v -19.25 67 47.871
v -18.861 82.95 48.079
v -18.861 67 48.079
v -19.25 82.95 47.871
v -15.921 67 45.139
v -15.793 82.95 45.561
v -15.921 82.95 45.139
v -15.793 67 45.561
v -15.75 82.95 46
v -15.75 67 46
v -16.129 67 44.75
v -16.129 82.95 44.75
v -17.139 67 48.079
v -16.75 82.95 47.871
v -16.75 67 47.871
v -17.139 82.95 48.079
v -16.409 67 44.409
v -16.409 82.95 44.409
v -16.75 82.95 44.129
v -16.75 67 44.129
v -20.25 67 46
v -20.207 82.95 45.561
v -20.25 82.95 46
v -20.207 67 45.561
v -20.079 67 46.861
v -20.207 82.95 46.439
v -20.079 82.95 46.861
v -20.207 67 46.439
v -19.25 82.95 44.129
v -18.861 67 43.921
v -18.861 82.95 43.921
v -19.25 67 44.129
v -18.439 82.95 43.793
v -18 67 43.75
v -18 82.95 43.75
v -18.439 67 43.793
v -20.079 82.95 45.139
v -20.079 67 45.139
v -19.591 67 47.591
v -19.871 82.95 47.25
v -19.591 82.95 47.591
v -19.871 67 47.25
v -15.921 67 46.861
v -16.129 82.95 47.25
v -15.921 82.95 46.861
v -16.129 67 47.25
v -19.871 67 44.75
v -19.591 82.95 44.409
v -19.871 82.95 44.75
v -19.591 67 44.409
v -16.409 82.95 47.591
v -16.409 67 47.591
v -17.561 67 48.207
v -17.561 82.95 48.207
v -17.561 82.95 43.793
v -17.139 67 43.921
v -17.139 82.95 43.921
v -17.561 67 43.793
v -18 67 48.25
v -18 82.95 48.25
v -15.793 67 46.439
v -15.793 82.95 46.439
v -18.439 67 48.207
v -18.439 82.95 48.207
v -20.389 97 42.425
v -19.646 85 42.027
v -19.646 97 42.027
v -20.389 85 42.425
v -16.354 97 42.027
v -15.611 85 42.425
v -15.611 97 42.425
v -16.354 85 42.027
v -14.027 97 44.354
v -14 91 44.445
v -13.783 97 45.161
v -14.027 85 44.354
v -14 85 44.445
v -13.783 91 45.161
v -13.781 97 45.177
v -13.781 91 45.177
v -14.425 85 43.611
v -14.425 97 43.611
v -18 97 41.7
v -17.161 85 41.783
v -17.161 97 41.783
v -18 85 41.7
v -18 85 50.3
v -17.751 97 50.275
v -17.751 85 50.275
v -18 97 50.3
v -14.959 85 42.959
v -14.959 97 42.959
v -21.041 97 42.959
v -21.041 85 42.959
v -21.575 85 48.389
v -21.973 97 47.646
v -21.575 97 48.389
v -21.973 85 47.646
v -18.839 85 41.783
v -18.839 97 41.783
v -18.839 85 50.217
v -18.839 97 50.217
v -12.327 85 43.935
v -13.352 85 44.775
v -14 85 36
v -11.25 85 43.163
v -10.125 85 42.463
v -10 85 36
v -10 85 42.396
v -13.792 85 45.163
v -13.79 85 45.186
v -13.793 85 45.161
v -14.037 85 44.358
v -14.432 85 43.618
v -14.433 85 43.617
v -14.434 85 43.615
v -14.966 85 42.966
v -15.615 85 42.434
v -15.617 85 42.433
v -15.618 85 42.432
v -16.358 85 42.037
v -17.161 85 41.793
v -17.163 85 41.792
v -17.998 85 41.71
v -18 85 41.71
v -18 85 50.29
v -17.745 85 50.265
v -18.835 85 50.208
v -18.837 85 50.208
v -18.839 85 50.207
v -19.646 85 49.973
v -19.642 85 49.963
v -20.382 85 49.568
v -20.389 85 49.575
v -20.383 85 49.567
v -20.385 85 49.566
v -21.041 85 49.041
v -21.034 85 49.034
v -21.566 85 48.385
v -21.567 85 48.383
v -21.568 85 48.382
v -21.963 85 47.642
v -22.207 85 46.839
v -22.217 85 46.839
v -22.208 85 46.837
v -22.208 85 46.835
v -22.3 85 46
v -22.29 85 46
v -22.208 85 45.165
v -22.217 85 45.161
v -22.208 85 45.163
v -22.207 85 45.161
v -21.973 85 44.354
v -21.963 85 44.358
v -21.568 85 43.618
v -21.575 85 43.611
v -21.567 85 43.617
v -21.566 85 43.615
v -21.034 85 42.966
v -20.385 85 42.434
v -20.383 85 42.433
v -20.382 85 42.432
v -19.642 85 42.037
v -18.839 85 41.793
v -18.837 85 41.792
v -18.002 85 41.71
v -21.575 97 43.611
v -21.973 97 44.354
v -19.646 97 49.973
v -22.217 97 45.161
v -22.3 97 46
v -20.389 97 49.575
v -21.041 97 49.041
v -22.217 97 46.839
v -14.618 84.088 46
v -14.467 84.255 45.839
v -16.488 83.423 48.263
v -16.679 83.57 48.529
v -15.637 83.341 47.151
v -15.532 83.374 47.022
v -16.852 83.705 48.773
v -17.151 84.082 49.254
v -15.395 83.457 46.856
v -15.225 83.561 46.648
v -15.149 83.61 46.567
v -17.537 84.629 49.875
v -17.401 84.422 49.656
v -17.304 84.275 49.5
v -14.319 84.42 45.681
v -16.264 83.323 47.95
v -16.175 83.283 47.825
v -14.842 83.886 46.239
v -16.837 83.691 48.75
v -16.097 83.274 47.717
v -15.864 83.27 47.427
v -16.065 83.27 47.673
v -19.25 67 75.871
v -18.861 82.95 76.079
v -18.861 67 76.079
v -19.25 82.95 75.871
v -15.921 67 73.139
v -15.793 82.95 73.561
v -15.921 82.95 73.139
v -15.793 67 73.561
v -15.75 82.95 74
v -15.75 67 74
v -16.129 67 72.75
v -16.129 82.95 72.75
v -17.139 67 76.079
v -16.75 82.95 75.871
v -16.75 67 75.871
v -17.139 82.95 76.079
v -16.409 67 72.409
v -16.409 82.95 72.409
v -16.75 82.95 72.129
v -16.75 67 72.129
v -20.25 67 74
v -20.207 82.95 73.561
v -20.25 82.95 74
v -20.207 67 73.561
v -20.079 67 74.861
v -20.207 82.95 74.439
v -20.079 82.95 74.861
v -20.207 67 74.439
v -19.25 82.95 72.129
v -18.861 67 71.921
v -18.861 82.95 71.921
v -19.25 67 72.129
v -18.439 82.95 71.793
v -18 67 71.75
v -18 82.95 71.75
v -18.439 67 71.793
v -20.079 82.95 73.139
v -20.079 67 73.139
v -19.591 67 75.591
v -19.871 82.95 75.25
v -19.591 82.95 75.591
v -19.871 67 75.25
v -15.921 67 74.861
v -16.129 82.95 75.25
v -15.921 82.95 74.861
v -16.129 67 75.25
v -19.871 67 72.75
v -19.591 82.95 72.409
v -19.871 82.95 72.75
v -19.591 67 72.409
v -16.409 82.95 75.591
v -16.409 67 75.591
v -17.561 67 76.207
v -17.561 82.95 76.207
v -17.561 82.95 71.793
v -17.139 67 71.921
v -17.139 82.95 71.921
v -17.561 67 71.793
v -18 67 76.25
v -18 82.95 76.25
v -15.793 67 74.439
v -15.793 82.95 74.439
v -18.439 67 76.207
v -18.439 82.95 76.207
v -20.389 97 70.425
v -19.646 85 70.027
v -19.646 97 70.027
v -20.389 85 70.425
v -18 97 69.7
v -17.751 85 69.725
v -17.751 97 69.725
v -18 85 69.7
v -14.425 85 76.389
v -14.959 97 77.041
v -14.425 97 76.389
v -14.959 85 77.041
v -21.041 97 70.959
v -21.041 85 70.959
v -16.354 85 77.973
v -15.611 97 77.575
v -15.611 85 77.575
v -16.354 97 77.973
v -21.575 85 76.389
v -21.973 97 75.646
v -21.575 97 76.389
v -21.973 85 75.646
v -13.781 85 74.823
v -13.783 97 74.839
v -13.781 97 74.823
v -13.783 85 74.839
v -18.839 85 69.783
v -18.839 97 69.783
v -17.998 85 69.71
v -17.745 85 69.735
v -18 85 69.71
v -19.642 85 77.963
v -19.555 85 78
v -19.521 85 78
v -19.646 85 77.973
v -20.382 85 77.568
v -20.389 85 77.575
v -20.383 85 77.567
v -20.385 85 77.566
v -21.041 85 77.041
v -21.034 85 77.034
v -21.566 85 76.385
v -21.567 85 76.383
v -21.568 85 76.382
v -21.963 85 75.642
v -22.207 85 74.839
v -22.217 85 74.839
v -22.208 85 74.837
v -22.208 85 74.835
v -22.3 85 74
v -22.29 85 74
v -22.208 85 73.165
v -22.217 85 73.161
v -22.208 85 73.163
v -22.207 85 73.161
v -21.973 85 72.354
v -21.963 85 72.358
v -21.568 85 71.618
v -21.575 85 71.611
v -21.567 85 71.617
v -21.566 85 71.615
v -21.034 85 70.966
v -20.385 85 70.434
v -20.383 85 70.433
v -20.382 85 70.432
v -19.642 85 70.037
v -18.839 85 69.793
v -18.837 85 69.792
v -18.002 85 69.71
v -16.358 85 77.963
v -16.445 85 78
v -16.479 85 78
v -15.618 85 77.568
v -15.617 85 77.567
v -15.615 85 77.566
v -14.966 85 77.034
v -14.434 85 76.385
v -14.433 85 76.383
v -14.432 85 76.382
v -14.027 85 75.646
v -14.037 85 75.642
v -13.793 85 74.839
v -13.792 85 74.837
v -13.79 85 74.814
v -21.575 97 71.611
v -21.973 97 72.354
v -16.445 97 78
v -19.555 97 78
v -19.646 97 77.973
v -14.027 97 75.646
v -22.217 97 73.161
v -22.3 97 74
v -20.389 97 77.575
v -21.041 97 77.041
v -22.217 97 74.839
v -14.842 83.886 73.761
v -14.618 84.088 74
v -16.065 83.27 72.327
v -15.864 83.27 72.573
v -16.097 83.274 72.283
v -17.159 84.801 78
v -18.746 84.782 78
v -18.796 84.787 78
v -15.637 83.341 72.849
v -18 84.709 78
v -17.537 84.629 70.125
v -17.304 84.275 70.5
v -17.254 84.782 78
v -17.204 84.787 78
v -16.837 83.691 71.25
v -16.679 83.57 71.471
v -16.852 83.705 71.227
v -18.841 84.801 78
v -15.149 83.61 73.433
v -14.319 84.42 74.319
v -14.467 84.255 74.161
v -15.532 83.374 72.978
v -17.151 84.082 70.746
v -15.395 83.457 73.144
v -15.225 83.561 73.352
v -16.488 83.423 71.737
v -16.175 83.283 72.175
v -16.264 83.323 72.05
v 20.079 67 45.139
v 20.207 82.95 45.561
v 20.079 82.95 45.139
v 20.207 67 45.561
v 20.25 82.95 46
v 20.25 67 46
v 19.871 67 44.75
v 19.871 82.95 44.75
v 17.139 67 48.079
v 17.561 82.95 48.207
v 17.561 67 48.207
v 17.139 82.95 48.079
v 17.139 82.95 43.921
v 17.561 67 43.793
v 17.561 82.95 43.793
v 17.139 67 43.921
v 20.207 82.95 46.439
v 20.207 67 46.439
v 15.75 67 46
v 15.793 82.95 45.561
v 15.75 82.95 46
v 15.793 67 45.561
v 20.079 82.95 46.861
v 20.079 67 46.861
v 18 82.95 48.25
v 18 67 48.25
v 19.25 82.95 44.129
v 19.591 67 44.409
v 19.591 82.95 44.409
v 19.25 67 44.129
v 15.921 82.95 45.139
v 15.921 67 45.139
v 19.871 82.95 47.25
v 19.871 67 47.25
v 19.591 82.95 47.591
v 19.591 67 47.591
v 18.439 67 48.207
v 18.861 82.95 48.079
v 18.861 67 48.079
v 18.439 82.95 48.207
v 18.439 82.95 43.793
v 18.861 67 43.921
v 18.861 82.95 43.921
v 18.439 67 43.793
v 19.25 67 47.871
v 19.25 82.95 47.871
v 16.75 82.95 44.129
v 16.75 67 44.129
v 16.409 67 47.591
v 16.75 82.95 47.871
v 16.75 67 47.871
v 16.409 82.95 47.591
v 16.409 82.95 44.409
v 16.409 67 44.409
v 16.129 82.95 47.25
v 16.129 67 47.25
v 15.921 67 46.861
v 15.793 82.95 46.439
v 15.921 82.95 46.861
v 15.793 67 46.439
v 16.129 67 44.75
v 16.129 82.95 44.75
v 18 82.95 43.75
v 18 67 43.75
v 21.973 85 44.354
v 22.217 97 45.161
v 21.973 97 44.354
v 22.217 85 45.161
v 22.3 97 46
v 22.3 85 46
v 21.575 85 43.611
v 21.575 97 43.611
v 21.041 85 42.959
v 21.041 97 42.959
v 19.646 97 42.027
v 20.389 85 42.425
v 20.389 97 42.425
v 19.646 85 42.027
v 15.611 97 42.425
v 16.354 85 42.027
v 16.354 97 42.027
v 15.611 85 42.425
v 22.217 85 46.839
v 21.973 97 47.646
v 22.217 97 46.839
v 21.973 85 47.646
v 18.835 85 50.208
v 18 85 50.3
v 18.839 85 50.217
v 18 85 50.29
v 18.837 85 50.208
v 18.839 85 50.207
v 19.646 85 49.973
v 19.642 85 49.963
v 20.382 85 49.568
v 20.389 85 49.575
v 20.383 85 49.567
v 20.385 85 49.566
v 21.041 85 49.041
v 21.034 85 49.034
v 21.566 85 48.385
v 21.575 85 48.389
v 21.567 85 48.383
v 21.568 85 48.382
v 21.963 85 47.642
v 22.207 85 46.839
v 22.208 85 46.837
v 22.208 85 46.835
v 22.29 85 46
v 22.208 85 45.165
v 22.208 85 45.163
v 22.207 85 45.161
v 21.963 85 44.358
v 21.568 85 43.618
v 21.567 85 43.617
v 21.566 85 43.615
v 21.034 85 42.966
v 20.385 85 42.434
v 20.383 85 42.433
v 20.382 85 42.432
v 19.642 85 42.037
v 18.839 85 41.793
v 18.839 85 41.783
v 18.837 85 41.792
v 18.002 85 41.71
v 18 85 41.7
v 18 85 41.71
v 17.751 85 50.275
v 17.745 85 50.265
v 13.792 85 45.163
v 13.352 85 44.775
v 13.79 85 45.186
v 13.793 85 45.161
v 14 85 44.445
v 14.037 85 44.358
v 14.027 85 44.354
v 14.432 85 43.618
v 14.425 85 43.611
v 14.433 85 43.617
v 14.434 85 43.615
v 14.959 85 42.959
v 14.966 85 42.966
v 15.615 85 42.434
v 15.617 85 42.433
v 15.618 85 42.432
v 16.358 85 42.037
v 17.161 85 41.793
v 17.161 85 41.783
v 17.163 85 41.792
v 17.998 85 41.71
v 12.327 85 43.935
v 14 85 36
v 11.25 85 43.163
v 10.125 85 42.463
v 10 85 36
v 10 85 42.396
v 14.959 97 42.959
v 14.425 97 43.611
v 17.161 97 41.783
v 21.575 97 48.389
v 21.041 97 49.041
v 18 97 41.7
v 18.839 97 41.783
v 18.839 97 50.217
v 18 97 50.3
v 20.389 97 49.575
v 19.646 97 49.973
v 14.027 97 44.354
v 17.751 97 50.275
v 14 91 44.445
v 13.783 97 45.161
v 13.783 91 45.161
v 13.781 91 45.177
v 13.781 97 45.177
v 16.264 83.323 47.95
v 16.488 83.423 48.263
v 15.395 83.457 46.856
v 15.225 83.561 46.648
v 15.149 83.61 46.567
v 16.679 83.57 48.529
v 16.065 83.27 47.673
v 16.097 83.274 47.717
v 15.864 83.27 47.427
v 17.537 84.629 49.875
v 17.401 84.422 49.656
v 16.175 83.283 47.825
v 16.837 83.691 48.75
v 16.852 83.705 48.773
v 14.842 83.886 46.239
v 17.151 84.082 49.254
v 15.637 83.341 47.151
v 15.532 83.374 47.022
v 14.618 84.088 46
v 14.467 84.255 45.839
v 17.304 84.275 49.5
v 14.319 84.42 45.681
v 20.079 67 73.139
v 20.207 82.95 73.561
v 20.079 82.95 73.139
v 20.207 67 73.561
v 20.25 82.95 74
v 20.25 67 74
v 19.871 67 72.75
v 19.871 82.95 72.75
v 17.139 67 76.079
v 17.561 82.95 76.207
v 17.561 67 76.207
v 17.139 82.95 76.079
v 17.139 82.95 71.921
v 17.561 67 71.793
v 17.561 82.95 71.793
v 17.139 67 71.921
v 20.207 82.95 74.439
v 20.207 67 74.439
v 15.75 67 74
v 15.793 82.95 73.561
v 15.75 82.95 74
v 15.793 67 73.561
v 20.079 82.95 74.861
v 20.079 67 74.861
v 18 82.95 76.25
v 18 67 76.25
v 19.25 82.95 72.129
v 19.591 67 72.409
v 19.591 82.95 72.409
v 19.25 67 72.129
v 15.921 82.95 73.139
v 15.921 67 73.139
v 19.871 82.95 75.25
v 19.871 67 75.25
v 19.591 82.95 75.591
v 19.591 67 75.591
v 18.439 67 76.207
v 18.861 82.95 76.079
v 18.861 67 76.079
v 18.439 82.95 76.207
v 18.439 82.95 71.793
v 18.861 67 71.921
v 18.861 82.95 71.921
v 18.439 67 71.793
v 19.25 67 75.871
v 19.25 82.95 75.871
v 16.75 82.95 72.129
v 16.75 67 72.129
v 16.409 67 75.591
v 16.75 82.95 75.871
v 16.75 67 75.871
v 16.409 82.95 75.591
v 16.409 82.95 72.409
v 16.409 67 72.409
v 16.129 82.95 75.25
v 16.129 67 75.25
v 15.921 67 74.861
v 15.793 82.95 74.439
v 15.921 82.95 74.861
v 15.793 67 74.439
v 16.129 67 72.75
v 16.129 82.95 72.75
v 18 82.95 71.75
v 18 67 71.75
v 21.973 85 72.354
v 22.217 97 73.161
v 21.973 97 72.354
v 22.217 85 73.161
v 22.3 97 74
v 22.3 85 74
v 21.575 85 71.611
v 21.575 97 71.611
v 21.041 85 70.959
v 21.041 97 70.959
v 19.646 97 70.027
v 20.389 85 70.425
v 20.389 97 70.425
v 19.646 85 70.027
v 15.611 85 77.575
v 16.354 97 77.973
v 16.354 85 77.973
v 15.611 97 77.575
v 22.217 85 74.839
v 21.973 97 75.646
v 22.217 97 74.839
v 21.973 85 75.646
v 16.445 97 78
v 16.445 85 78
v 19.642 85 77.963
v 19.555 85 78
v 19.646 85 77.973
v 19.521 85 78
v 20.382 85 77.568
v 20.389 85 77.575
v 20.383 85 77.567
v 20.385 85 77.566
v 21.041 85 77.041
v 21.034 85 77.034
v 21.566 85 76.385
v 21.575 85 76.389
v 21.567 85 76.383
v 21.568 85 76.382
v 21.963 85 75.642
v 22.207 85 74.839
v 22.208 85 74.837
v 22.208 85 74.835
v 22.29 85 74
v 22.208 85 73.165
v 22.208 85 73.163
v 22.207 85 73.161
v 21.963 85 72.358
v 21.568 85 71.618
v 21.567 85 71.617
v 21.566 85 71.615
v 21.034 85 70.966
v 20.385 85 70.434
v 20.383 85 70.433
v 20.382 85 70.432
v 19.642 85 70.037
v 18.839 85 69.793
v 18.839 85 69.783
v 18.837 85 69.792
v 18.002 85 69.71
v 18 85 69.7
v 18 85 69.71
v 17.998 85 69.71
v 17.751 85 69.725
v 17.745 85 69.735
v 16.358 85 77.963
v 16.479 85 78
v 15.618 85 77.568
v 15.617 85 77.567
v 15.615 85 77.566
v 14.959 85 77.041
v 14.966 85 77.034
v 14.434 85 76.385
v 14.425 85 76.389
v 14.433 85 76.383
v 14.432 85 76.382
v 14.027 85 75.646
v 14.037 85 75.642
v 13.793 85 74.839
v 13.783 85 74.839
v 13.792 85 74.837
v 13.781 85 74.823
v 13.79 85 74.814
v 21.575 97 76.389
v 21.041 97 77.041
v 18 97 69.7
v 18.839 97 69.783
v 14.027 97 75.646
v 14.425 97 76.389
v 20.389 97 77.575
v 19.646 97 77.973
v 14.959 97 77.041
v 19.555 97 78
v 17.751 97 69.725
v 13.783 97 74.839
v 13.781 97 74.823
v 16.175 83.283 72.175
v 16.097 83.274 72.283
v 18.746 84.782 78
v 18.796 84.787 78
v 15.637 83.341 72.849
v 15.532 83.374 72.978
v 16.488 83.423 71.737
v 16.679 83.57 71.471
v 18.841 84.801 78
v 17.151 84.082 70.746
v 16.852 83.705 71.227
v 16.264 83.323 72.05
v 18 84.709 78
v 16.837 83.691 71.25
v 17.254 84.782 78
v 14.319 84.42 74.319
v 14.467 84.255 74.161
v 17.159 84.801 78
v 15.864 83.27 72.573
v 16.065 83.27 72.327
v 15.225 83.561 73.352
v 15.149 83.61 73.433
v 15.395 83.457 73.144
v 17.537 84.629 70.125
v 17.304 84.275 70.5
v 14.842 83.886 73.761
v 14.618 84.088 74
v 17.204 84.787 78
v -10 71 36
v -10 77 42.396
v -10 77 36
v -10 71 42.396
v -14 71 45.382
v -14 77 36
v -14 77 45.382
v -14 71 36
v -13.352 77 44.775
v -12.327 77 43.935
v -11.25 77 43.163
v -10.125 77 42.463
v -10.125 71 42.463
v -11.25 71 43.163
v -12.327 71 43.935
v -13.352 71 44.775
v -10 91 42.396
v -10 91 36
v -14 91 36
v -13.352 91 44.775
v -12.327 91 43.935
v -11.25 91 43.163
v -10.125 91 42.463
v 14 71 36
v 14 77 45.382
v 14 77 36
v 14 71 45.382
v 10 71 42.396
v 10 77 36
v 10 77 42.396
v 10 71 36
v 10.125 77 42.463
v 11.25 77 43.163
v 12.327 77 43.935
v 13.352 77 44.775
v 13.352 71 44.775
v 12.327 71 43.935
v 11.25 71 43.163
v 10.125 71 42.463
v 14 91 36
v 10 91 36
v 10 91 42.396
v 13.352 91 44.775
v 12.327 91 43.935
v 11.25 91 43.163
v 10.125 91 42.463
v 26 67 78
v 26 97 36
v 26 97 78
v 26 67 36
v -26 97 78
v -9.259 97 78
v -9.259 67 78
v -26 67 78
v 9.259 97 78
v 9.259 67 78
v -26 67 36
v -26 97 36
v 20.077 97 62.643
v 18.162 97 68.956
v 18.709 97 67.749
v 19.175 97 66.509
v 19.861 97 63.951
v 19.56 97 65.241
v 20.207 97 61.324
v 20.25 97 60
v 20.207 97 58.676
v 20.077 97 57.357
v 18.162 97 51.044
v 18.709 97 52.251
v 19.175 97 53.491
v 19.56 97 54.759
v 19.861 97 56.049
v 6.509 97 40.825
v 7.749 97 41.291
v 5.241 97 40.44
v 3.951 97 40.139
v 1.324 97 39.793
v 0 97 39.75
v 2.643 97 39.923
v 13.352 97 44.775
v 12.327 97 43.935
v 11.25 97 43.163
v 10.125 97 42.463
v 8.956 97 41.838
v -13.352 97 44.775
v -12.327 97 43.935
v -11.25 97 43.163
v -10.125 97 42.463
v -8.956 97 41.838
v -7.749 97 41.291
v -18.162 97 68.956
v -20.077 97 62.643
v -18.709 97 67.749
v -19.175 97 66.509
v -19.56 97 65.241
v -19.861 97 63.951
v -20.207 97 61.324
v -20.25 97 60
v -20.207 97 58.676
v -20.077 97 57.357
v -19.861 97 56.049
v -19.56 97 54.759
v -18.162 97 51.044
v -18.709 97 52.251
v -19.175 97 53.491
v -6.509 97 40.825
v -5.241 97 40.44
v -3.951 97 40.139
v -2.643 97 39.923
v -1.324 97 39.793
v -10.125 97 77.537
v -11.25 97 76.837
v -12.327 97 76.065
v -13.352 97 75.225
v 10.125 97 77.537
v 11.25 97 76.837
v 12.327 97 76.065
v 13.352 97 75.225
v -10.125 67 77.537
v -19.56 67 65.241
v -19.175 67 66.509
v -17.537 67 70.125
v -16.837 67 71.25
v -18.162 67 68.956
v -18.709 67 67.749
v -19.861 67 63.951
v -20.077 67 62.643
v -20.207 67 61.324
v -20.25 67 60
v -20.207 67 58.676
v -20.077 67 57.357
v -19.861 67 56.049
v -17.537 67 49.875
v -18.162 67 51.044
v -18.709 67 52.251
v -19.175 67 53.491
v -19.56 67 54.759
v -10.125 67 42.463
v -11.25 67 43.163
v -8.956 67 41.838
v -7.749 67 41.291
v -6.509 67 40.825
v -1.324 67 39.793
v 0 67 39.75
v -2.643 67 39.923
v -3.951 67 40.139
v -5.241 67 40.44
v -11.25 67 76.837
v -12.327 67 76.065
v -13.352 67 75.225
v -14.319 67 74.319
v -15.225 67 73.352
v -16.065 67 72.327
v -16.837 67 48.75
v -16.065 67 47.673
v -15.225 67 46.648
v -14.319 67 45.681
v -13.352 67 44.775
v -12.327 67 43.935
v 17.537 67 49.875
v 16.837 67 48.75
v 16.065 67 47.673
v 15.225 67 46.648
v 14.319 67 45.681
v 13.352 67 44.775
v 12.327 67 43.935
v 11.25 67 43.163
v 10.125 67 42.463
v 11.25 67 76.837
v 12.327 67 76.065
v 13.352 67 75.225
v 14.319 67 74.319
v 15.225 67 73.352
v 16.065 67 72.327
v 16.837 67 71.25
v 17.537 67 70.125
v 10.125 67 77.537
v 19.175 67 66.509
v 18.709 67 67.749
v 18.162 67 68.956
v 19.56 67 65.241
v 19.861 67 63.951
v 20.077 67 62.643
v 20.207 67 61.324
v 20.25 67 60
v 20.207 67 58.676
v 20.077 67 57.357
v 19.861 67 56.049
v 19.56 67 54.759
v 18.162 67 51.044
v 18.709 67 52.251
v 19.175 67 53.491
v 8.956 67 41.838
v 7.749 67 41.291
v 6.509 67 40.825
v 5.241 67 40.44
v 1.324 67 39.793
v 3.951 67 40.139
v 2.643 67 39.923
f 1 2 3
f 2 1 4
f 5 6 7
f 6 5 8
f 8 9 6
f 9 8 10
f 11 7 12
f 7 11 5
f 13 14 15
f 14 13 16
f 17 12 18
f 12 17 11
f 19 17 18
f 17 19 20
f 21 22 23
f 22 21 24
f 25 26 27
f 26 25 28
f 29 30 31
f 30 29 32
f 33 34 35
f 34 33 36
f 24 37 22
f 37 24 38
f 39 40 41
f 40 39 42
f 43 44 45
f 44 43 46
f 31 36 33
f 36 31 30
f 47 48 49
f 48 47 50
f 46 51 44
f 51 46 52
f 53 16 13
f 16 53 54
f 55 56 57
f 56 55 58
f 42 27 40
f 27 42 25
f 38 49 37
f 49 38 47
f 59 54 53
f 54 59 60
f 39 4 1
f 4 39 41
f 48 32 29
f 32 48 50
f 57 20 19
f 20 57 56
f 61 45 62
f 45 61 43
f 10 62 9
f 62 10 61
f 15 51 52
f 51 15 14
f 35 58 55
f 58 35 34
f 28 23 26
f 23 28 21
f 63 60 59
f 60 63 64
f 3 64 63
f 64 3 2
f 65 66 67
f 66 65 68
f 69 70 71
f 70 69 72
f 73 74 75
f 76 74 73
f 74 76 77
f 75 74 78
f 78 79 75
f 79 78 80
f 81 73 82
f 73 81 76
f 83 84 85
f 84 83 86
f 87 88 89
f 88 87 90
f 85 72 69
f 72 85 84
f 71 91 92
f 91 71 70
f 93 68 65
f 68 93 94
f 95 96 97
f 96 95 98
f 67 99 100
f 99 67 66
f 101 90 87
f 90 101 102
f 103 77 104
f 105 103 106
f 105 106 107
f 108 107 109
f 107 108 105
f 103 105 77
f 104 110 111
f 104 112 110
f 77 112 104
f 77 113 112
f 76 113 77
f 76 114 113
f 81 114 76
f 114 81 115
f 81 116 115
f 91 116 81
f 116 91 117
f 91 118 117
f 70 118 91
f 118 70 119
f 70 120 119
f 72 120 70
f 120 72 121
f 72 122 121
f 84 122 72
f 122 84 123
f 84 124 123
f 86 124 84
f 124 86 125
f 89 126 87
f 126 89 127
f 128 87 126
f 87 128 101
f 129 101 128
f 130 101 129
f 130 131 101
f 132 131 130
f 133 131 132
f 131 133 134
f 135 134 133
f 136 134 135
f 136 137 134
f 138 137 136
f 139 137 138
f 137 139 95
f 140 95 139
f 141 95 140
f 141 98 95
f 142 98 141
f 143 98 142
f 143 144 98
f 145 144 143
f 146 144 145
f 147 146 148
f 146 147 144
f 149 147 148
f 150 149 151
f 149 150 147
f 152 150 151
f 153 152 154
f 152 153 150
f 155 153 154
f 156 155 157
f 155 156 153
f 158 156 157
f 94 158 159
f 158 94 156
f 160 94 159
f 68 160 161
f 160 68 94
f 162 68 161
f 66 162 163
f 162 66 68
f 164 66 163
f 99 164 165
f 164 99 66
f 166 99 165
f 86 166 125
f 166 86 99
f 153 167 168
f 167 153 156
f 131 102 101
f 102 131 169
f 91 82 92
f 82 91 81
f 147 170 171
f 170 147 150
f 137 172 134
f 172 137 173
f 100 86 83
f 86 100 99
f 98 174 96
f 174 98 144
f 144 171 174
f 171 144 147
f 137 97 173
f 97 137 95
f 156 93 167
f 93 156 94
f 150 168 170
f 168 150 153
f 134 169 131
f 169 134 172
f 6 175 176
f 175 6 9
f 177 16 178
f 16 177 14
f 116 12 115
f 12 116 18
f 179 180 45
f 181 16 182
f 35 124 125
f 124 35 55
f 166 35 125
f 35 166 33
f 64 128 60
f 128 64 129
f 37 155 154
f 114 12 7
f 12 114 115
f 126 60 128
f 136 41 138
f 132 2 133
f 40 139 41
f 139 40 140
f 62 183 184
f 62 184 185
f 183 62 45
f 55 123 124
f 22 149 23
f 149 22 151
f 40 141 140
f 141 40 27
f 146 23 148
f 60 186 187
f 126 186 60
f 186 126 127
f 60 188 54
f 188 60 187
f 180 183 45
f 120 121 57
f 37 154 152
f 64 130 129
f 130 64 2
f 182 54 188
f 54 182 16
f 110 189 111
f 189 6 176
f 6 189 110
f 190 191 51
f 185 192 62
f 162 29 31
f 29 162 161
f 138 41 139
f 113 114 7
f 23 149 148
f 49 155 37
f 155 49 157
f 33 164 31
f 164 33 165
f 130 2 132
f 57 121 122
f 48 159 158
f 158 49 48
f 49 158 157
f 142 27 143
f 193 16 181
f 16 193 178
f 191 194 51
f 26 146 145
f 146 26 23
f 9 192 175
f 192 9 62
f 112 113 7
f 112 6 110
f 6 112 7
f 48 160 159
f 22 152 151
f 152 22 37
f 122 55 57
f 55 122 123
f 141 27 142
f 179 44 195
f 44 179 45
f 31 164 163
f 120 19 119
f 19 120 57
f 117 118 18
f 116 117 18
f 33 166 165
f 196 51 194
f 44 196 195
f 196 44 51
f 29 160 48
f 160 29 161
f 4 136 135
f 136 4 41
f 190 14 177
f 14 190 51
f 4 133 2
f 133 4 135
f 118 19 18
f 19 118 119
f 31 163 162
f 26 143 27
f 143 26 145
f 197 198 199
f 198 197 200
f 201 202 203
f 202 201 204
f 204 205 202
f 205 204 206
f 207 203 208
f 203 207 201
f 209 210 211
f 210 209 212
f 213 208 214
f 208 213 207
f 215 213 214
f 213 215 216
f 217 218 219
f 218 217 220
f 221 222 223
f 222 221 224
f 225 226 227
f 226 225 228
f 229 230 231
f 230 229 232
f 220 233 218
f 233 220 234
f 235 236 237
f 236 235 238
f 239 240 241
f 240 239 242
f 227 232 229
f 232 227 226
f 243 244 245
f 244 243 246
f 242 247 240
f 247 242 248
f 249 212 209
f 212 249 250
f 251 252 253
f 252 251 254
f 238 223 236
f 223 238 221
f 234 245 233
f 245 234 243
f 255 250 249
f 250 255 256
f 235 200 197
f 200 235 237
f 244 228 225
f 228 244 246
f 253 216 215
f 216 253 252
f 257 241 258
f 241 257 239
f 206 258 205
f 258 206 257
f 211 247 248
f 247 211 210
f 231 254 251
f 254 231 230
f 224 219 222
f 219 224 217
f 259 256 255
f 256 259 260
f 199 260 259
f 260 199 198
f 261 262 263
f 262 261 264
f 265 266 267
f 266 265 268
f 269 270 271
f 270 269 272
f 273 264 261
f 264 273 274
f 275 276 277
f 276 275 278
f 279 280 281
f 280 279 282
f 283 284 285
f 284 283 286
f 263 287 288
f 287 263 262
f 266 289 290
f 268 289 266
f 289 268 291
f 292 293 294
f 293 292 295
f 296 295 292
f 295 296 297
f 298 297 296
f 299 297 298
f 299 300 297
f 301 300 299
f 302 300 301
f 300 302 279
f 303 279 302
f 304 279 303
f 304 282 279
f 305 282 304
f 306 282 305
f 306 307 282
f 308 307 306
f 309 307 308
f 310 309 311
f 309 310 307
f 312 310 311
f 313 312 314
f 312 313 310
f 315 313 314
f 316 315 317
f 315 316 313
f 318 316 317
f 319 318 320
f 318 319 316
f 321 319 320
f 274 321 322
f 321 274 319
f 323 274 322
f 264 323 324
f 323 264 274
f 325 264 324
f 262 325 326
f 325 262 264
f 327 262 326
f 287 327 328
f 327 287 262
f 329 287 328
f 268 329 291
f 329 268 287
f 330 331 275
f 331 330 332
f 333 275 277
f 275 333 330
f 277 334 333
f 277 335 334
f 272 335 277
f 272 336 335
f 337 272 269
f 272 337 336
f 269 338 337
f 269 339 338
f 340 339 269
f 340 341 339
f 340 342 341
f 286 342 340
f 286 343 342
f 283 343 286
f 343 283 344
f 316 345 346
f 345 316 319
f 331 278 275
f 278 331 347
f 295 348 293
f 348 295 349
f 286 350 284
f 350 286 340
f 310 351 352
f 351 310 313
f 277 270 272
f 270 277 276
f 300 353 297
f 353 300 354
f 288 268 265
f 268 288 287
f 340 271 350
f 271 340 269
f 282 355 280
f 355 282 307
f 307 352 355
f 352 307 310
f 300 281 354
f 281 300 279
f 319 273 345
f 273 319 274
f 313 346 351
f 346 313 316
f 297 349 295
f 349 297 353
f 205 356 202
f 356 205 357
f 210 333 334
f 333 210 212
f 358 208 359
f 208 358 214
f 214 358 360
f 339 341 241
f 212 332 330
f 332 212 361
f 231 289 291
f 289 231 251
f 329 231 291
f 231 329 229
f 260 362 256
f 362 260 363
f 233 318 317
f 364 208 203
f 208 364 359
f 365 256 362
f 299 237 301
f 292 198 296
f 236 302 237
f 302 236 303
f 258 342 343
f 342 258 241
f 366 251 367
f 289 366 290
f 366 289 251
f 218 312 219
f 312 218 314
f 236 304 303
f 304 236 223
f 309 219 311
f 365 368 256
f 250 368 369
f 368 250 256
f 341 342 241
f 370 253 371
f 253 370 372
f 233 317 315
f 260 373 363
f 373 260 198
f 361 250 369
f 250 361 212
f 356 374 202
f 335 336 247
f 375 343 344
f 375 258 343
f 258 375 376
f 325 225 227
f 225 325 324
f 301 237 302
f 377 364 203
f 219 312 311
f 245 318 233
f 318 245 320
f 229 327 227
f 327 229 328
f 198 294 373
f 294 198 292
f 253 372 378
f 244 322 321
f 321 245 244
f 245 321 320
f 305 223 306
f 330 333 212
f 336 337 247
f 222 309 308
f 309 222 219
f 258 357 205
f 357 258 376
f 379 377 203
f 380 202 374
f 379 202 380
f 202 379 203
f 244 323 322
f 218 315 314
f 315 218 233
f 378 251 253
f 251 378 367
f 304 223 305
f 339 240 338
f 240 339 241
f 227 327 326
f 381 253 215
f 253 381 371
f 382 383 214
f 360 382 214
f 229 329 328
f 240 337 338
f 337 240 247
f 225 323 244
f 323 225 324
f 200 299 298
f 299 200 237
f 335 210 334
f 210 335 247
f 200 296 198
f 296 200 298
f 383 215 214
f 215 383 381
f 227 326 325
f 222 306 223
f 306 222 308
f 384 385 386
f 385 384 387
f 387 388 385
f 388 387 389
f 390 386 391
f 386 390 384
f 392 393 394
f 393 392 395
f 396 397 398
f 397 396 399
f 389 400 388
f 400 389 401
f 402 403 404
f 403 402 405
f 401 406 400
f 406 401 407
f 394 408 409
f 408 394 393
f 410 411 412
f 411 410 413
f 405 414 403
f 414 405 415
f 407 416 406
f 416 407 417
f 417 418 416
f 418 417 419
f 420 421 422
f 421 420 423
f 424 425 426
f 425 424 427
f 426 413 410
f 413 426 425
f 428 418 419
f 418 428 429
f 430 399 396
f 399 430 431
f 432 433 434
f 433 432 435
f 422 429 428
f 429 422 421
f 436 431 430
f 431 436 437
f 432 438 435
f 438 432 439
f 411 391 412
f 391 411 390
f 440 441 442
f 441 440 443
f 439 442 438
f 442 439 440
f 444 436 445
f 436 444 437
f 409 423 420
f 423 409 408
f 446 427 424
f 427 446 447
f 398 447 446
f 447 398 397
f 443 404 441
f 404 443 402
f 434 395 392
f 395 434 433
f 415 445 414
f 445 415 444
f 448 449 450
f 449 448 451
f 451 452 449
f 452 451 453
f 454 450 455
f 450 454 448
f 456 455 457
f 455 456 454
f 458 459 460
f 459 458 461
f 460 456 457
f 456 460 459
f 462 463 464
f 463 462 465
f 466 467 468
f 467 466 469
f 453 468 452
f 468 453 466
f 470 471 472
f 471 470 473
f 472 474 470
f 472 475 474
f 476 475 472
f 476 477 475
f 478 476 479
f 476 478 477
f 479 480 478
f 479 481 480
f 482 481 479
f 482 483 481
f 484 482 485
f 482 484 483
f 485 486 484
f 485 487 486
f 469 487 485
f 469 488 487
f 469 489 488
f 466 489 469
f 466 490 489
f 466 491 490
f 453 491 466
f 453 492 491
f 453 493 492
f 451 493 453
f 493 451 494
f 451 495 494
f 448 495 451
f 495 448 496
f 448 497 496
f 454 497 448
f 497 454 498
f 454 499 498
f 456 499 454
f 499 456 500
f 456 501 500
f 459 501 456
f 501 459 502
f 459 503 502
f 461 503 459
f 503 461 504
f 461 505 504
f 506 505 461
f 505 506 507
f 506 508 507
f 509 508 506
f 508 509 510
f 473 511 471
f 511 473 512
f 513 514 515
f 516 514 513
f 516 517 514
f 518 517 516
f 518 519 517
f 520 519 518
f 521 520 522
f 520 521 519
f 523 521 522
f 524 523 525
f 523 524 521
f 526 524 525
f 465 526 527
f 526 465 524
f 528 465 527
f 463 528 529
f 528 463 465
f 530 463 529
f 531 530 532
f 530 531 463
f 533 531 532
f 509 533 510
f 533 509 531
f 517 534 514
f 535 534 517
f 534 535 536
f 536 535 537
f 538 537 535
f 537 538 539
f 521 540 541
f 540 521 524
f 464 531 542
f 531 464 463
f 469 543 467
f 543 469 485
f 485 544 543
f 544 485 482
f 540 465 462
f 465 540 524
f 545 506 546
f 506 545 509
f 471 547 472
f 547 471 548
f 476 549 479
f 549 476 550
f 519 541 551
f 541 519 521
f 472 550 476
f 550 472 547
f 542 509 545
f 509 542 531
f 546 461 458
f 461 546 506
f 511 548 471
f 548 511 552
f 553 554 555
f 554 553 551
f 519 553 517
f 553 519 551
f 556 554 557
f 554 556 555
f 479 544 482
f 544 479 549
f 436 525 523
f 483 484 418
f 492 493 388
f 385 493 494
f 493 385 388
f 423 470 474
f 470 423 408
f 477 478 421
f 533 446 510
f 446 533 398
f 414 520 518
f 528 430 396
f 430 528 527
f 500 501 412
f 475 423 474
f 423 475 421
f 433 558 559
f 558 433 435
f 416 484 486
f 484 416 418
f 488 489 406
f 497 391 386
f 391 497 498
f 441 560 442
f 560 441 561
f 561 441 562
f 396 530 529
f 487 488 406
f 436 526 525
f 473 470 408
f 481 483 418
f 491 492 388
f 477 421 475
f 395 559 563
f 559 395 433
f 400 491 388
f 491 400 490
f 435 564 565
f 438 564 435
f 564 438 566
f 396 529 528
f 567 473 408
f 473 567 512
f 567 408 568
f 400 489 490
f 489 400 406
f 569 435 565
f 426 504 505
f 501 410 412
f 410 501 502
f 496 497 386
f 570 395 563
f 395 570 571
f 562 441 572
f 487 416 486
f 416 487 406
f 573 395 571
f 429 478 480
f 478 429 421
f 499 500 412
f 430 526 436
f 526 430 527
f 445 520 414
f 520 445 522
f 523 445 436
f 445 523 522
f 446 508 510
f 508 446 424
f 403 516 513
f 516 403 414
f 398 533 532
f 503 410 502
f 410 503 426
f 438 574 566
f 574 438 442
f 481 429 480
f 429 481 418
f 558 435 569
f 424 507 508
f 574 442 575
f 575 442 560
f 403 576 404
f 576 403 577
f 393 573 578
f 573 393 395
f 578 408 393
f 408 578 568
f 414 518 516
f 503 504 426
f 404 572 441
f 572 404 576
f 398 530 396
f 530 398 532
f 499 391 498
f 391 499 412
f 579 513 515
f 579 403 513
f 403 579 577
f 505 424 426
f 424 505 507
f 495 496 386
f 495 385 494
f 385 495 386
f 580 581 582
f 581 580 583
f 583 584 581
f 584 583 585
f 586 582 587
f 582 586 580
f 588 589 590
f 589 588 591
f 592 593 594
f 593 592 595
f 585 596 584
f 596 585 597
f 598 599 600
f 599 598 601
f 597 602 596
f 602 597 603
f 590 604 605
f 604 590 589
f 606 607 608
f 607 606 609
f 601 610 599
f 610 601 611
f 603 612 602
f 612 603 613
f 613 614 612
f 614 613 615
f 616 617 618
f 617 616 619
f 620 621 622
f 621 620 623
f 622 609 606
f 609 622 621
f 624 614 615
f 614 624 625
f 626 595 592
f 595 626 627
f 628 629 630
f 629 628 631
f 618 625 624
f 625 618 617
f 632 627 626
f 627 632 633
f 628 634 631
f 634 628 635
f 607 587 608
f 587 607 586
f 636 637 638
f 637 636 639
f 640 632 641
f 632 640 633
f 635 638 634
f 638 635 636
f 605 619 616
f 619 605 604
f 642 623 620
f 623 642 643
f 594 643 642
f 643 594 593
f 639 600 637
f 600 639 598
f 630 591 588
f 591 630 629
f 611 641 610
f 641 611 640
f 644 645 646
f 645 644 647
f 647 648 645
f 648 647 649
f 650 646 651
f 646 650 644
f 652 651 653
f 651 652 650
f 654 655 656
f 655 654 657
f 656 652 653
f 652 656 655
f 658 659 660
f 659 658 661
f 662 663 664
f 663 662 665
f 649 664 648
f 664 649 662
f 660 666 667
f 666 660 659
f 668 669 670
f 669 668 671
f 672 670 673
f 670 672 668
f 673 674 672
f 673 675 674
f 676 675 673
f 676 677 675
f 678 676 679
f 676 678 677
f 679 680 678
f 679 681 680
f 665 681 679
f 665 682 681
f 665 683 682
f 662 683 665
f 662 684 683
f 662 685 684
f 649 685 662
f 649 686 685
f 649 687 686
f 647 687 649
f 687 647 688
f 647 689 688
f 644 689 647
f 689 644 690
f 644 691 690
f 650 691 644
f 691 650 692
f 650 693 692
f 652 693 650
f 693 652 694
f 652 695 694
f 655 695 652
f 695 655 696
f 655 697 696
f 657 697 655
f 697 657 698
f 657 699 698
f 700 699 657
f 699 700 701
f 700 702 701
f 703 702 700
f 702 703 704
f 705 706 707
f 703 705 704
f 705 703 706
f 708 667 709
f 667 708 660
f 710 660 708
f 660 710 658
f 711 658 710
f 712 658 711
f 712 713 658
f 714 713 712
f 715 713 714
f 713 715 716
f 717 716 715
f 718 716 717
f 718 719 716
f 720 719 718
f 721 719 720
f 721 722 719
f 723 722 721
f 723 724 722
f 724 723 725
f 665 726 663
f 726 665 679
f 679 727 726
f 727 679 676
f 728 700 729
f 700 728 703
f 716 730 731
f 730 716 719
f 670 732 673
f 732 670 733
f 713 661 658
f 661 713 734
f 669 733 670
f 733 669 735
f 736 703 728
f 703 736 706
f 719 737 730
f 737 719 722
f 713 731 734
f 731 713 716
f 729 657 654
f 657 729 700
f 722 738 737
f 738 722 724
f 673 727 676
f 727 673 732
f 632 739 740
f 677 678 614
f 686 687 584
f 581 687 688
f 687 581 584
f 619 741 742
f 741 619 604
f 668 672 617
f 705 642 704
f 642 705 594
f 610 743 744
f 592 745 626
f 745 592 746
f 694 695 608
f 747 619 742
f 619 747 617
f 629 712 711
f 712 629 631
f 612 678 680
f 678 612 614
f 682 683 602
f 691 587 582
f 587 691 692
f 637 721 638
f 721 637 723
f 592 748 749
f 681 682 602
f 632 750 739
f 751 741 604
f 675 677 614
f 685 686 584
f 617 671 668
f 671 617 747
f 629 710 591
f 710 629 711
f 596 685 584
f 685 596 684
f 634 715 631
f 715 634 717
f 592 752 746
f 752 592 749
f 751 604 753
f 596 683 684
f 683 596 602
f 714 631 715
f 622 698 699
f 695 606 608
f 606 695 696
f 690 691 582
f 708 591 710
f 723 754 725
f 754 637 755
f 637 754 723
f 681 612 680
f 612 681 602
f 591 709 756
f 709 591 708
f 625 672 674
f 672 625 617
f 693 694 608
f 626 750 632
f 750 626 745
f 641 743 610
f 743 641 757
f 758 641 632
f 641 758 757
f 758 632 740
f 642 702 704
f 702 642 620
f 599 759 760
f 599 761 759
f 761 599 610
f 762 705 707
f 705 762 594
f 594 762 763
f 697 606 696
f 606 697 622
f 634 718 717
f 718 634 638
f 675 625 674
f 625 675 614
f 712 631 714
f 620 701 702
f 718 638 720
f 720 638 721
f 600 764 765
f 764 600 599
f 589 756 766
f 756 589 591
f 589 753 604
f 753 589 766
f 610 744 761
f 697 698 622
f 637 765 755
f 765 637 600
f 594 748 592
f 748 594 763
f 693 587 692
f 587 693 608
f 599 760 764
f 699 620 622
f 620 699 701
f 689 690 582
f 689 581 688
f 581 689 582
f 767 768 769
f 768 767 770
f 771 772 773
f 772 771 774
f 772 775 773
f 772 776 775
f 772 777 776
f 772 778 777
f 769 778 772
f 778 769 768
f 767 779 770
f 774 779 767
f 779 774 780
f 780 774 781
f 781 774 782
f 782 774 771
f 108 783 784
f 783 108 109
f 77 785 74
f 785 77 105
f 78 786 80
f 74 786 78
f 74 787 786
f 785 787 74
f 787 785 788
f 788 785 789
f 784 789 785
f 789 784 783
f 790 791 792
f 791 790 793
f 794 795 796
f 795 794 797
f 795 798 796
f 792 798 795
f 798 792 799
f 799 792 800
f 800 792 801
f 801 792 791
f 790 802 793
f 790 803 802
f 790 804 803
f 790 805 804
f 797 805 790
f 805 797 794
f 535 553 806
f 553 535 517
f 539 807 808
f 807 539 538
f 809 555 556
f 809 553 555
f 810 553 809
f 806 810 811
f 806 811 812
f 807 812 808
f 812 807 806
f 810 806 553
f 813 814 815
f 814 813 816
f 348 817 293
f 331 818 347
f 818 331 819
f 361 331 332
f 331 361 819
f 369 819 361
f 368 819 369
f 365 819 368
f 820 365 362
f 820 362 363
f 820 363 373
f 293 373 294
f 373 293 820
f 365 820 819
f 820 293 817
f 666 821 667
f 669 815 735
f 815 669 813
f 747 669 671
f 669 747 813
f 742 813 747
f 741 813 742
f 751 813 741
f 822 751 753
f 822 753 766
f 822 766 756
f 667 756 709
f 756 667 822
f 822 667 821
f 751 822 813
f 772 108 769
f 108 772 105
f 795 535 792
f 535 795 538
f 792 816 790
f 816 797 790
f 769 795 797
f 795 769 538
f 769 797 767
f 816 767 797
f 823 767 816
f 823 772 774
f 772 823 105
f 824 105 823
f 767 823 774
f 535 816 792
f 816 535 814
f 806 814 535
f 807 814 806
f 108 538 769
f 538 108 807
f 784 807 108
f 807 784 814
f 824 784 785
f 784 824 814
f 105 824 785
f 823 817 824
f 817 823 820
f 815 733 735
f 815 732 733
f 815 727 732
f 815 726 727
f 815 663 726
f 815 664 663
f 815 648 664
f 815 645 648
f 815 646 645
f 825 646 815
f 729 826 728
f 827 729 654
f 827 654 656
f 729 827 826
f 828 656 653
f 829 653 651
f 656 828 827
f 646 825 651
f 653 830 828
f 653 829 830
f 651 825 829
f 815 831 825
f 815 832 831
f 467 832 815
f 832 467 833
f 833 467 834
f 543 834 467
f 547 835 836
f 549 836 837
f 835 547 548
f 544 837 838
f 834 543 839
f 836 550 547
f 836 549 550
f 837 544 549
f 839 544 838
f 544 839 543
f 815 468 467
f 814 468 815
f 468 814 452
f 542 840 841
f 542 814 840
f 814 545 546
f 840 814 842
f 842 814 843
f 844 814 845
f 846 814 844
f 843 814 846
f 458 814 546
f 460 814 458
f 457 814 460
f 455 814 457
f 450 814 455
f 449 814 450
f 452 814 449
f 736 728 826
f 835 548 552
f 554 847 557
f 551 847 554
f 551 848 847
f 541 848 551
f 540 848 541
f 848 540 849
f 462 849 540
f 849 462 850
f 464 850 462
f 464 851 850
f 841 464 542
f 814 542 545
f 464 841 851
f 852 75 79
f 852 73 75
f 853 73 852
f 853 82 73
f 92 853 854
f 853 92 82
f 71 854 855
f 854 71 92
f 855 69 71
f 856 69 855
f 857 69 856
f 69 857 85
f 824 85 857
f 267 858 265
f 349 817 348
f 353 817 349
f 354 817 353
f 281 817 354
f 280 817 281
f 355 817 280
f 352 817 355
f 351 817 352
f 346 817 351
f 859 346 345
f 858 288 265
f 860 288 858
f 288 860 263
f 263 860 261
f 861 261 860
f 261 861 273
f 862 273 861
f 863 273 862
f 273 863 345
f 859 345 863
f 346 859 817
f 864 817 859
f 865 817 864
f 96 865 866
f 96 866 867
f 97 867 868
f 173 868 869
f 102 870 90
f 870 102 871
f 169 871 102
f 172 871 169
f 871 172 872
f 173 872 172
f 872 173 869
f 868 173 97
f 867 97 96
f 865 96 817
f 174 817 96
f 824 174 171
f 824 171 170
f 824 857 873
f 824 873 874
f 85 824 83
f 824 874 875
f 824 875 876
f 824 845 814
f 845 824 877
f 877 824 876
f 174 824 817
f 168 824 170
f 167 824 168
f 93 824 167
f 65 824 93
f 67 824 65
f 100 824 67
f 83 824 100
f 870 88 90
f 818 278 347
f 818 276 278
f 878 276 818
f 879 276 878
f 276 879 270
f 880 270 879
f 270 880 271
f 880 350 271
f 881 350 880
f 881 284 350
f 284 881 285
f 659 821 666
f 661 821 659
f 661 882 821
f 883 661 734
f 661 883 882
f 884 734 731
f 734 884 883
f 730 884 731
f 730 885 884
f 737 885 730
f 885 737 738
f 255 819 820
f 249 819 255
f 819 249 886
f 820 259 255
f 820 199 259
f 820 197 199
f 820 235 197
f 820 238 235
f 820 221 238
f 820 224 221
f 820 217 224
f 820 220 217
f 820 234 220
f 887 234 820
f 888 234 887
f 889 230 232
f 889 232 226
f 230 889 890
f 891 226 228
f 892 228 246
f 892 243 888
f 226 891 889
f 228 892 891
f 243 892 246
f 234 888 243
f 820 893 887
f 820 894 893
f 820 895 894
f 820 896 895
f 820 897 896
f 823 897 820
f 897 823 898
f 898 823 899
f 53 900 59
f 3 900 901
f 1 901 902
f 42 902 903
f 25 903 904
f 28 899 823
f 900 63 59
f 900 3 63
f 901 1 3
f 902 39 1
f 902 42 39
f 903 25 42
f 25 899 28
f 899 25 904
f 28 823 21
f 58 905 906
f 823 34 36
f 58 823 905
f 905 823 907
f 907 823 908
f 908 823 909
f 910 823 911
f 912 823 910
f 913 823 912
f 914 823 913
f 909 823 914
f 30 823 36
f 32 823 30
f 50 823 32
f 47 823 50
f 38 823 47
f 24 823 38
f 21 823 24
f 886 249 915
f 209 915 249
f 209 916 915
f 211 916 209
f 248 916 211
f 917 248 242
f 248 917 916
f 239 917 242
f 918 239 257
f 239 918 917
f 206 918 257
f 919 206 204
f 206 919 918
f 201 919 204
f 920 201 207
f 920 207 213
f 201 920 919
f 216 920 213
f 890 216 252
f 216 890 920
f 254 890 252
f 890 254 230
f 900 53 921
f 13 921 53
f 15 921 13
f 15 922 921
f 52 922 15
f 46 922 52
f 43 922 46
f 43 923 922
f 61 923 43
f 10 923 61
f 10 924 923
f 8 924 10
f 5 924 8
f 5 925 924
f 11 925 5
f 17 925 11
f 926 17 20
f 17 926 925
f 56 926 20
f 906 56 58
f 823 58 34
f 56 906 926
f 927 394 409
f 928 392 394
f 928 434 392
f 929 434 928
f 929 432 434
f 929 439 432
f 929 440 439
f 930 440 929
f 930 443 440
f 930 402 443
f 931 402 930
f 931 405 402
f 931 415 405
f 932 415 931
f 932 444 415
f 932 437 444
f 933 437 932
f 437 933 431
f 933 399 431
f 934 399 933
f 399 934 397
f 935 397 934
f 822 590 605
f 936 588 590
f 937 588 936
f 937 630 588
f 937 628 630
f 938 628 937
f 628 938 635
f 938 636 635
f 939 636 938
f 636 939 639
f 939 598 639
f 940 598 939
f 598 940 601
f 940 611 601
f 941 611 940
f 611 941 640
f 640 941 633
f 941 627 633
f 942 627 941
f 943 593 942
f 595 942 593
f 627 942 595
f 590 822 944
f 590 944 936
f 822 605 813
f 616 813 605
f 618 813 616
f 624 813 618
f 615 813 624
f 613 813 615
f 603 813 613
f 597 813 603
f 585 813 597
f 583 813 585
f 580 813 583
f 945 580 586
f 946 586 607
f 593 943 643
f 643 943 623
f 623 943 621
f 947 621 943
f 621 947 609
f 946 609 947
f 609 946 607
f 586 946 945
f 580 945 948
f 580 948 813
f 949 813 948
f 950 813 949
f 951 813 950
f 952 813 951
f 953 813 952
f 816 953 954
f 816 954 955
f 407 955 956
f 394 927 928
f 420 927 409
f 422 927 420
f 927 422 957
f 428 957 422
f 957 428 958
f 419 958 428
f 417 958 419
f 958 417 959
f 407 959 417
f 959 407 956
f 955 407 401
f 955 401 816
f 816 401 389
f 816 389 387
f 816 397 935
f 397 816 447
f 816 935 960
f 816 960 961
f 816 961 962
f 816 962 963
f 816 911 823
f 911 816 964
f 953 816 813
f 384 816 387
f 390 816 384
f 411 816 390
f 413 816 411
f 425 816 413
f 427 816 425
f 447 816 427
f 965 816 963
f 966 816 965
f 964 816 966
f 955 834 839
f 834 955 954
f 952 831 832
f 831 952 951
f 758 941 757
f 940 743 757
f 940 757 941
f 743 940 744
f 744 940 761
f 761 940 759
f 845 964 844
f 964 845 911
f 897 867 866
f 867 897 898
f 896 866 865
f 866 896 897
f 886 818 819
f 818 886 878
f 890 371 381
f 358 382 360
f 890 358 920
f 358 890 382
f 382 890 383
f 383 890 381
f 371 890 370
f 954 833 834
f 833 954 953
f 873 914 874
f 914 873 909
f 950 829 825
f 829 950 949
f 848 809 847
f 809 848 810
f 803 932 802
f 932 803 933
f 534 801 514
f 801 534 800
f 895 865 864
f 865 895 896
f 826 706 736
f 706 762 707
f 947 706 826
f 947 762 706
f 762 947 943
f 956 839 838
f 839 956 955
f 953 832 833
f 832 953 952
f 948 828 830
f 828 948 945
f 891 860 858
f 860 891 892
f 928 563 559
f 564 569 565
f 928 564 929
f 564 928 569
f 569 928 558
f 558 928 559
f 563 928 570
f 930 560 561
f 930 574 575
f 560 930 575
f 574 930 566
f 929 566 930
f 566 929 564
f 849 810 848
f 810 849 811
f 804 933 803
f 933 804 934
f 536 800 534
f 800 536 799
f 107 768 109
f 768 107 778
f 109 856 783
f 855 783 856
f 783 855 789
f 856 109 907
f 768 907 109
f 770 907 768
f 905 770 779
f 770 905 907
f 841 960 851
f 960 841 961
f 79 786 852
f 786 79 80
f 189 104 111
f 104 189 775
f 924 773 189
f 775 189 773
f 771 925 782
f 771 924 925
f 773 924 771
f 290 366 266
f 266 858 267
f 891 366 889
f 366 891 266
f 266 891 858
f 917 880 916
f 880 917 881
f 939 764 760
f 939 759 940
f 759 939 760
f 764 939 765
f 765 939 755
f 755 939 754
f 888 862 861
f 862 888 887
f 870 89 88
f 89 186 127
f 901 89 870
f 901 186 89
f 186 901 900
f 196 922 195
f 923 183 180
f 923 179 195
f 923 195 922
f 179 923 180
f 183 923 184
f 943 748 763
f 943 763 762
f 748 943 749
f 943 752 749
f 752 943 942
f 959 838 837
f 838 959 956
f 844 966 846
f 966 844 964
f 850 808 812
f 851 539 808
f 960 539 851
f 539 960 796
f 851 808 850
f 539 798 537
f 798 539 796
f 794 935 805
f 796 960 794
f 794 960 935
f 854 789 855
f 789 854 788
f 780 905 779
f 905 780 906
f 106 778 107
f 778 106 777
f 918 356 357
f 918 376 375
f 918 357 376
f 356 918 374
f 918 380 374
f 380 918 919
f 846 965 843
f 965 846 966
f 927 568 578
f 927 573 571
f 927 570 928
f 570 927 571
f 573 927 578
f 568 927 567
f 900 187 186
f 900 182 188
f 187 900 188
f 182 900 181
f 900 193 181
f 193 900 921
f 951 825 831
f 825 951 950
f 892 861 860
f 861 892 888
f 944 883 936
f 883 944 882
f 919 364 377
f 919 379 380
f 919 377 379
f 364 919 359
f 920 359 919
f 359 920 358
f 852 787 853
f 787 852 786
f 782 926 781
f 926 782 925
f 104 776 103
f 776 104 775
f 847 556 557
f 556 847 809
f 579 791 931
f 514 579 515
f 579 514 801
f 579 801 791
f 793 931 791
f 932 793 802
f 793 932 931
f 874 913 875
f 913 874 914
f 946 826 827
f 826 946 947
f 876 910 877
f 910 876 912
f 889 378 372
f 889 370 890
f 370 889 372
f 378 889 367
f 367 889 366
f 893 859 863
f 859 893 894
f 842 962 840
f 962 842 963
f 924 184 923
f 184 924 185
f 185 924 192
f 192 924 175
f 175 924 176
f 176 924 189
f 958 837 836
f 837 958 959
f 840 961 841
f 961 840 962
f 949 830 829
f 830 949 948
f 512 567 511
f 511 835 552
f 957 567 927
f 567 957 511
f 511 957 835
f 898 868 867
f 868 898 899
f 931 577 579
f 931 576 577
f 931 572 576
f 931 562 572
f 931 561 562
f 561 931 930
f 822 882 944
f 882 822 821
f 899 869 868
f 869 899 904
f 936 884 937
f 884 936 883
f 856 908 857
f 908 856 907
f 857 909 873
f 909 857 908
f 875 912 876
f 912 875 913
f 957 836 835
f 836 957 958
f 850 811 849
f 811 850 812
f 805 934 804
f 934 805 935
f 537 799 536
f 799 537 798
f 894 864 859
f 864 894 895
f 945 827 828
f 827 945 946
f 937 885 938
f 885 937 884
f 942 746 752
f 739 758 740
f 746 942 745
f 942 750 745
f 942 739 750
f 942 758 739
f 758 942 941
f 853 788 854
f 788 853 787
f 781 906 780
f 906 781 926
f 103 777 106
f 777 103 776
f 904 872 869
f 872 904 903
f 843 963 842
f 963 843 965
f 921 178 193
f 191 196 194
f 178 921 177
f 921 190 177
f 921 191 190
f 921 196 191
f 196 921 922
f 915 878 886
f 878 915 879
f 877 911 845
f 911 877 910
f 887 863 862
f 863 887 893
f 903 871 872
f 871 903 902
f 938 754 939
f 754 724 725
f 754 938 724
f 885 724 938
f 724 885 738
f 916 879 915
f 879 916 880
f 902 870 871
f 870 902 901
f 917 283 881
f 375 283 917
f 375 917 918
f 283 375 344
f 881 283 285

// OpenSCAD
// =====================================================================
// child_light_saddle.scad — 子機 水中ライト鞍座 (再設計版・汎用)
//
// 旧 child_light_clamp の置き換え。ワニ顎ゲート (child_jaw_gate) の前面
// ライトパッド (平面 y=67、M4 下穴 x=±18 / z=46,74) に M4 ×4 で締結し、
// 円筒ライト (Ø light_d 仮 40 — **未選定、要実測**) を Y 軸方向に差し込んで
// 結束バンド 2 本で固定する。ライトの向き = +Y (カメラと同方向)。
//
// 座標系: 機体グローバル (チューブ軸 z、+Y 前)。
// 印刷向き: 背面 (y=67 の取付面) をベッドへ。ボアが垂直になりサポートレス。
// 荷重: ライト 0.3 kg × 10g ≈ 30 N (L2 輸送)。M4 ×4 と 30mm 幅ブロックには
//   桁違いに小さい (ネジ面圧 < 1 MPa)。FEA 不要 (全体系 FEA はコアフレーム側)。
// =====================================================================

/* [ライト (未選定 — 仮値)] */
light_d   = 40;      // 胴径。選定後に実測で置換
light_clr = 0.5;

/* [ゲートのライトパッド (二重定義 — child_jaw_gate と揃える)] */
pad_y     = 67;      // 取付面
lm4_x     = 18;      // M4 位置 (±)
lm4_z     = [46, 74];

/* [ブロック] */
blk_hw    = 26;      // 半幅 (x)
blk_d     = 30;      // 奥行 (y): 67..97
blk_z0    = 36;
blk_z1    = 78;
ax_z      = 60;      // ライト軸の z (ゲートの M4 パターン中心)

/* [締結] */
m4_d      = 4.5;     // M4 クリアランス
cb_d      = 8.6;     // 頭座ぐり
cb_dep    = 12;

/* [結束バンド スロット] */
tie_x     = [10, 14];       // |x| 範囲
tie_y     = [[71, 77], [85, 91]];
tie_z0    = 35;

/* [Hidden] */
fudge = 0.01;
$fn = 96;

// ---- 導出値 ----------------------------------------------------------
bore_r  = (light_d + light_clr) / 2;
blk_y1  = pad_y + blk_d;

// ---- 検査 ------------------------------------------------------------
assert(abs(lm4_z[1] - ax_z) - m4_d/2 - sqrt(max(bore_r*bore_r - lm4_x*lm4_x, 0)) >= 2,
       "M4 穴とライトボアの壁 < 2mm");
assert(blk_hw - lm4_x - cb_d/2 >= 3, "座ぐりの x 端距離不足");
assert(ax_z - bore_r > blk_z0 + 3,  "ボア底の床厚 < 3mm (床を下げよ)");
assert(ax_z + bore_r > blk_z1,      "上スロットが開いていない (挿入は軸方向の想定)");
assert(tie_x[0] > 4 && tie_x[1] < lm4_x - m4_d/2 - 1, "結束スロットが M4 に掛かる");
assert(blk_y1 <= 125 - 5, "鞍座が 250 枠 (保護代) を超える");
echo(str("ボア z ", ax_z - bore_r, " .. ", ax_z + bore_r, " / ブロック ", 2*blk_hw,
         " x ", blk_d, " x ", blk_z1 - blk_z0));

// ---- 形状 ------------------------------------------------------------
difference() {
    translate([-blk_hw, pad_y, blk_z0])
        cube([2*blk_hw, blk_d, blk_z1 - blk_z0]);

    // ライトボア (軸 Y、上に開口)
    translate([0, pad_y - fudge, ax_z])
        rotate([-90, 0, 0]) cylinder(r = bore_r, h = blk_d + 2*fudge);

    // M4 ×4 (軸 Y) + 前面座ぐり (天井 45° コーン)
    for (sx = [-1, 1], z = lm4_z) {
        translate([sx*lm4_x, pad_y - fudge, z])
            rotate([-90, 0, 0]) cylinder(d = m4_d, h = blk_d + 2*fudge, $fn = 32);
        translate([sx*lm4_x, blk_y1 - cb_dep, z])
            rotate([-90, 0, 0]) cylinder(d = cb_d, h = cb_dep + fudge, $fn = 32);
        translate([sx*lm4_x, blk_y1 - cb_dep - (cb_d - m4_d)/2, z])
            rotate([-90, 0, 0]) cylinder(d1 = m4_d, d2 = cb_d, h = (cb_d - m4_d)/2 + fudge, $fn = 32);
    }

    // 結束バンド スロット ×4 (床貫通、バンドはライトに 2 周)
    for (sx = [-1, 1], ty = tie_y)
        translate([sx > 0 ? tie_x[0] : -tie_x[1], ty[0], tie_z0 - fudge])
            cube([tie_x[1] - tie_x[0], ty[1] - ty[0], ax_z - tie_z0]);
}
